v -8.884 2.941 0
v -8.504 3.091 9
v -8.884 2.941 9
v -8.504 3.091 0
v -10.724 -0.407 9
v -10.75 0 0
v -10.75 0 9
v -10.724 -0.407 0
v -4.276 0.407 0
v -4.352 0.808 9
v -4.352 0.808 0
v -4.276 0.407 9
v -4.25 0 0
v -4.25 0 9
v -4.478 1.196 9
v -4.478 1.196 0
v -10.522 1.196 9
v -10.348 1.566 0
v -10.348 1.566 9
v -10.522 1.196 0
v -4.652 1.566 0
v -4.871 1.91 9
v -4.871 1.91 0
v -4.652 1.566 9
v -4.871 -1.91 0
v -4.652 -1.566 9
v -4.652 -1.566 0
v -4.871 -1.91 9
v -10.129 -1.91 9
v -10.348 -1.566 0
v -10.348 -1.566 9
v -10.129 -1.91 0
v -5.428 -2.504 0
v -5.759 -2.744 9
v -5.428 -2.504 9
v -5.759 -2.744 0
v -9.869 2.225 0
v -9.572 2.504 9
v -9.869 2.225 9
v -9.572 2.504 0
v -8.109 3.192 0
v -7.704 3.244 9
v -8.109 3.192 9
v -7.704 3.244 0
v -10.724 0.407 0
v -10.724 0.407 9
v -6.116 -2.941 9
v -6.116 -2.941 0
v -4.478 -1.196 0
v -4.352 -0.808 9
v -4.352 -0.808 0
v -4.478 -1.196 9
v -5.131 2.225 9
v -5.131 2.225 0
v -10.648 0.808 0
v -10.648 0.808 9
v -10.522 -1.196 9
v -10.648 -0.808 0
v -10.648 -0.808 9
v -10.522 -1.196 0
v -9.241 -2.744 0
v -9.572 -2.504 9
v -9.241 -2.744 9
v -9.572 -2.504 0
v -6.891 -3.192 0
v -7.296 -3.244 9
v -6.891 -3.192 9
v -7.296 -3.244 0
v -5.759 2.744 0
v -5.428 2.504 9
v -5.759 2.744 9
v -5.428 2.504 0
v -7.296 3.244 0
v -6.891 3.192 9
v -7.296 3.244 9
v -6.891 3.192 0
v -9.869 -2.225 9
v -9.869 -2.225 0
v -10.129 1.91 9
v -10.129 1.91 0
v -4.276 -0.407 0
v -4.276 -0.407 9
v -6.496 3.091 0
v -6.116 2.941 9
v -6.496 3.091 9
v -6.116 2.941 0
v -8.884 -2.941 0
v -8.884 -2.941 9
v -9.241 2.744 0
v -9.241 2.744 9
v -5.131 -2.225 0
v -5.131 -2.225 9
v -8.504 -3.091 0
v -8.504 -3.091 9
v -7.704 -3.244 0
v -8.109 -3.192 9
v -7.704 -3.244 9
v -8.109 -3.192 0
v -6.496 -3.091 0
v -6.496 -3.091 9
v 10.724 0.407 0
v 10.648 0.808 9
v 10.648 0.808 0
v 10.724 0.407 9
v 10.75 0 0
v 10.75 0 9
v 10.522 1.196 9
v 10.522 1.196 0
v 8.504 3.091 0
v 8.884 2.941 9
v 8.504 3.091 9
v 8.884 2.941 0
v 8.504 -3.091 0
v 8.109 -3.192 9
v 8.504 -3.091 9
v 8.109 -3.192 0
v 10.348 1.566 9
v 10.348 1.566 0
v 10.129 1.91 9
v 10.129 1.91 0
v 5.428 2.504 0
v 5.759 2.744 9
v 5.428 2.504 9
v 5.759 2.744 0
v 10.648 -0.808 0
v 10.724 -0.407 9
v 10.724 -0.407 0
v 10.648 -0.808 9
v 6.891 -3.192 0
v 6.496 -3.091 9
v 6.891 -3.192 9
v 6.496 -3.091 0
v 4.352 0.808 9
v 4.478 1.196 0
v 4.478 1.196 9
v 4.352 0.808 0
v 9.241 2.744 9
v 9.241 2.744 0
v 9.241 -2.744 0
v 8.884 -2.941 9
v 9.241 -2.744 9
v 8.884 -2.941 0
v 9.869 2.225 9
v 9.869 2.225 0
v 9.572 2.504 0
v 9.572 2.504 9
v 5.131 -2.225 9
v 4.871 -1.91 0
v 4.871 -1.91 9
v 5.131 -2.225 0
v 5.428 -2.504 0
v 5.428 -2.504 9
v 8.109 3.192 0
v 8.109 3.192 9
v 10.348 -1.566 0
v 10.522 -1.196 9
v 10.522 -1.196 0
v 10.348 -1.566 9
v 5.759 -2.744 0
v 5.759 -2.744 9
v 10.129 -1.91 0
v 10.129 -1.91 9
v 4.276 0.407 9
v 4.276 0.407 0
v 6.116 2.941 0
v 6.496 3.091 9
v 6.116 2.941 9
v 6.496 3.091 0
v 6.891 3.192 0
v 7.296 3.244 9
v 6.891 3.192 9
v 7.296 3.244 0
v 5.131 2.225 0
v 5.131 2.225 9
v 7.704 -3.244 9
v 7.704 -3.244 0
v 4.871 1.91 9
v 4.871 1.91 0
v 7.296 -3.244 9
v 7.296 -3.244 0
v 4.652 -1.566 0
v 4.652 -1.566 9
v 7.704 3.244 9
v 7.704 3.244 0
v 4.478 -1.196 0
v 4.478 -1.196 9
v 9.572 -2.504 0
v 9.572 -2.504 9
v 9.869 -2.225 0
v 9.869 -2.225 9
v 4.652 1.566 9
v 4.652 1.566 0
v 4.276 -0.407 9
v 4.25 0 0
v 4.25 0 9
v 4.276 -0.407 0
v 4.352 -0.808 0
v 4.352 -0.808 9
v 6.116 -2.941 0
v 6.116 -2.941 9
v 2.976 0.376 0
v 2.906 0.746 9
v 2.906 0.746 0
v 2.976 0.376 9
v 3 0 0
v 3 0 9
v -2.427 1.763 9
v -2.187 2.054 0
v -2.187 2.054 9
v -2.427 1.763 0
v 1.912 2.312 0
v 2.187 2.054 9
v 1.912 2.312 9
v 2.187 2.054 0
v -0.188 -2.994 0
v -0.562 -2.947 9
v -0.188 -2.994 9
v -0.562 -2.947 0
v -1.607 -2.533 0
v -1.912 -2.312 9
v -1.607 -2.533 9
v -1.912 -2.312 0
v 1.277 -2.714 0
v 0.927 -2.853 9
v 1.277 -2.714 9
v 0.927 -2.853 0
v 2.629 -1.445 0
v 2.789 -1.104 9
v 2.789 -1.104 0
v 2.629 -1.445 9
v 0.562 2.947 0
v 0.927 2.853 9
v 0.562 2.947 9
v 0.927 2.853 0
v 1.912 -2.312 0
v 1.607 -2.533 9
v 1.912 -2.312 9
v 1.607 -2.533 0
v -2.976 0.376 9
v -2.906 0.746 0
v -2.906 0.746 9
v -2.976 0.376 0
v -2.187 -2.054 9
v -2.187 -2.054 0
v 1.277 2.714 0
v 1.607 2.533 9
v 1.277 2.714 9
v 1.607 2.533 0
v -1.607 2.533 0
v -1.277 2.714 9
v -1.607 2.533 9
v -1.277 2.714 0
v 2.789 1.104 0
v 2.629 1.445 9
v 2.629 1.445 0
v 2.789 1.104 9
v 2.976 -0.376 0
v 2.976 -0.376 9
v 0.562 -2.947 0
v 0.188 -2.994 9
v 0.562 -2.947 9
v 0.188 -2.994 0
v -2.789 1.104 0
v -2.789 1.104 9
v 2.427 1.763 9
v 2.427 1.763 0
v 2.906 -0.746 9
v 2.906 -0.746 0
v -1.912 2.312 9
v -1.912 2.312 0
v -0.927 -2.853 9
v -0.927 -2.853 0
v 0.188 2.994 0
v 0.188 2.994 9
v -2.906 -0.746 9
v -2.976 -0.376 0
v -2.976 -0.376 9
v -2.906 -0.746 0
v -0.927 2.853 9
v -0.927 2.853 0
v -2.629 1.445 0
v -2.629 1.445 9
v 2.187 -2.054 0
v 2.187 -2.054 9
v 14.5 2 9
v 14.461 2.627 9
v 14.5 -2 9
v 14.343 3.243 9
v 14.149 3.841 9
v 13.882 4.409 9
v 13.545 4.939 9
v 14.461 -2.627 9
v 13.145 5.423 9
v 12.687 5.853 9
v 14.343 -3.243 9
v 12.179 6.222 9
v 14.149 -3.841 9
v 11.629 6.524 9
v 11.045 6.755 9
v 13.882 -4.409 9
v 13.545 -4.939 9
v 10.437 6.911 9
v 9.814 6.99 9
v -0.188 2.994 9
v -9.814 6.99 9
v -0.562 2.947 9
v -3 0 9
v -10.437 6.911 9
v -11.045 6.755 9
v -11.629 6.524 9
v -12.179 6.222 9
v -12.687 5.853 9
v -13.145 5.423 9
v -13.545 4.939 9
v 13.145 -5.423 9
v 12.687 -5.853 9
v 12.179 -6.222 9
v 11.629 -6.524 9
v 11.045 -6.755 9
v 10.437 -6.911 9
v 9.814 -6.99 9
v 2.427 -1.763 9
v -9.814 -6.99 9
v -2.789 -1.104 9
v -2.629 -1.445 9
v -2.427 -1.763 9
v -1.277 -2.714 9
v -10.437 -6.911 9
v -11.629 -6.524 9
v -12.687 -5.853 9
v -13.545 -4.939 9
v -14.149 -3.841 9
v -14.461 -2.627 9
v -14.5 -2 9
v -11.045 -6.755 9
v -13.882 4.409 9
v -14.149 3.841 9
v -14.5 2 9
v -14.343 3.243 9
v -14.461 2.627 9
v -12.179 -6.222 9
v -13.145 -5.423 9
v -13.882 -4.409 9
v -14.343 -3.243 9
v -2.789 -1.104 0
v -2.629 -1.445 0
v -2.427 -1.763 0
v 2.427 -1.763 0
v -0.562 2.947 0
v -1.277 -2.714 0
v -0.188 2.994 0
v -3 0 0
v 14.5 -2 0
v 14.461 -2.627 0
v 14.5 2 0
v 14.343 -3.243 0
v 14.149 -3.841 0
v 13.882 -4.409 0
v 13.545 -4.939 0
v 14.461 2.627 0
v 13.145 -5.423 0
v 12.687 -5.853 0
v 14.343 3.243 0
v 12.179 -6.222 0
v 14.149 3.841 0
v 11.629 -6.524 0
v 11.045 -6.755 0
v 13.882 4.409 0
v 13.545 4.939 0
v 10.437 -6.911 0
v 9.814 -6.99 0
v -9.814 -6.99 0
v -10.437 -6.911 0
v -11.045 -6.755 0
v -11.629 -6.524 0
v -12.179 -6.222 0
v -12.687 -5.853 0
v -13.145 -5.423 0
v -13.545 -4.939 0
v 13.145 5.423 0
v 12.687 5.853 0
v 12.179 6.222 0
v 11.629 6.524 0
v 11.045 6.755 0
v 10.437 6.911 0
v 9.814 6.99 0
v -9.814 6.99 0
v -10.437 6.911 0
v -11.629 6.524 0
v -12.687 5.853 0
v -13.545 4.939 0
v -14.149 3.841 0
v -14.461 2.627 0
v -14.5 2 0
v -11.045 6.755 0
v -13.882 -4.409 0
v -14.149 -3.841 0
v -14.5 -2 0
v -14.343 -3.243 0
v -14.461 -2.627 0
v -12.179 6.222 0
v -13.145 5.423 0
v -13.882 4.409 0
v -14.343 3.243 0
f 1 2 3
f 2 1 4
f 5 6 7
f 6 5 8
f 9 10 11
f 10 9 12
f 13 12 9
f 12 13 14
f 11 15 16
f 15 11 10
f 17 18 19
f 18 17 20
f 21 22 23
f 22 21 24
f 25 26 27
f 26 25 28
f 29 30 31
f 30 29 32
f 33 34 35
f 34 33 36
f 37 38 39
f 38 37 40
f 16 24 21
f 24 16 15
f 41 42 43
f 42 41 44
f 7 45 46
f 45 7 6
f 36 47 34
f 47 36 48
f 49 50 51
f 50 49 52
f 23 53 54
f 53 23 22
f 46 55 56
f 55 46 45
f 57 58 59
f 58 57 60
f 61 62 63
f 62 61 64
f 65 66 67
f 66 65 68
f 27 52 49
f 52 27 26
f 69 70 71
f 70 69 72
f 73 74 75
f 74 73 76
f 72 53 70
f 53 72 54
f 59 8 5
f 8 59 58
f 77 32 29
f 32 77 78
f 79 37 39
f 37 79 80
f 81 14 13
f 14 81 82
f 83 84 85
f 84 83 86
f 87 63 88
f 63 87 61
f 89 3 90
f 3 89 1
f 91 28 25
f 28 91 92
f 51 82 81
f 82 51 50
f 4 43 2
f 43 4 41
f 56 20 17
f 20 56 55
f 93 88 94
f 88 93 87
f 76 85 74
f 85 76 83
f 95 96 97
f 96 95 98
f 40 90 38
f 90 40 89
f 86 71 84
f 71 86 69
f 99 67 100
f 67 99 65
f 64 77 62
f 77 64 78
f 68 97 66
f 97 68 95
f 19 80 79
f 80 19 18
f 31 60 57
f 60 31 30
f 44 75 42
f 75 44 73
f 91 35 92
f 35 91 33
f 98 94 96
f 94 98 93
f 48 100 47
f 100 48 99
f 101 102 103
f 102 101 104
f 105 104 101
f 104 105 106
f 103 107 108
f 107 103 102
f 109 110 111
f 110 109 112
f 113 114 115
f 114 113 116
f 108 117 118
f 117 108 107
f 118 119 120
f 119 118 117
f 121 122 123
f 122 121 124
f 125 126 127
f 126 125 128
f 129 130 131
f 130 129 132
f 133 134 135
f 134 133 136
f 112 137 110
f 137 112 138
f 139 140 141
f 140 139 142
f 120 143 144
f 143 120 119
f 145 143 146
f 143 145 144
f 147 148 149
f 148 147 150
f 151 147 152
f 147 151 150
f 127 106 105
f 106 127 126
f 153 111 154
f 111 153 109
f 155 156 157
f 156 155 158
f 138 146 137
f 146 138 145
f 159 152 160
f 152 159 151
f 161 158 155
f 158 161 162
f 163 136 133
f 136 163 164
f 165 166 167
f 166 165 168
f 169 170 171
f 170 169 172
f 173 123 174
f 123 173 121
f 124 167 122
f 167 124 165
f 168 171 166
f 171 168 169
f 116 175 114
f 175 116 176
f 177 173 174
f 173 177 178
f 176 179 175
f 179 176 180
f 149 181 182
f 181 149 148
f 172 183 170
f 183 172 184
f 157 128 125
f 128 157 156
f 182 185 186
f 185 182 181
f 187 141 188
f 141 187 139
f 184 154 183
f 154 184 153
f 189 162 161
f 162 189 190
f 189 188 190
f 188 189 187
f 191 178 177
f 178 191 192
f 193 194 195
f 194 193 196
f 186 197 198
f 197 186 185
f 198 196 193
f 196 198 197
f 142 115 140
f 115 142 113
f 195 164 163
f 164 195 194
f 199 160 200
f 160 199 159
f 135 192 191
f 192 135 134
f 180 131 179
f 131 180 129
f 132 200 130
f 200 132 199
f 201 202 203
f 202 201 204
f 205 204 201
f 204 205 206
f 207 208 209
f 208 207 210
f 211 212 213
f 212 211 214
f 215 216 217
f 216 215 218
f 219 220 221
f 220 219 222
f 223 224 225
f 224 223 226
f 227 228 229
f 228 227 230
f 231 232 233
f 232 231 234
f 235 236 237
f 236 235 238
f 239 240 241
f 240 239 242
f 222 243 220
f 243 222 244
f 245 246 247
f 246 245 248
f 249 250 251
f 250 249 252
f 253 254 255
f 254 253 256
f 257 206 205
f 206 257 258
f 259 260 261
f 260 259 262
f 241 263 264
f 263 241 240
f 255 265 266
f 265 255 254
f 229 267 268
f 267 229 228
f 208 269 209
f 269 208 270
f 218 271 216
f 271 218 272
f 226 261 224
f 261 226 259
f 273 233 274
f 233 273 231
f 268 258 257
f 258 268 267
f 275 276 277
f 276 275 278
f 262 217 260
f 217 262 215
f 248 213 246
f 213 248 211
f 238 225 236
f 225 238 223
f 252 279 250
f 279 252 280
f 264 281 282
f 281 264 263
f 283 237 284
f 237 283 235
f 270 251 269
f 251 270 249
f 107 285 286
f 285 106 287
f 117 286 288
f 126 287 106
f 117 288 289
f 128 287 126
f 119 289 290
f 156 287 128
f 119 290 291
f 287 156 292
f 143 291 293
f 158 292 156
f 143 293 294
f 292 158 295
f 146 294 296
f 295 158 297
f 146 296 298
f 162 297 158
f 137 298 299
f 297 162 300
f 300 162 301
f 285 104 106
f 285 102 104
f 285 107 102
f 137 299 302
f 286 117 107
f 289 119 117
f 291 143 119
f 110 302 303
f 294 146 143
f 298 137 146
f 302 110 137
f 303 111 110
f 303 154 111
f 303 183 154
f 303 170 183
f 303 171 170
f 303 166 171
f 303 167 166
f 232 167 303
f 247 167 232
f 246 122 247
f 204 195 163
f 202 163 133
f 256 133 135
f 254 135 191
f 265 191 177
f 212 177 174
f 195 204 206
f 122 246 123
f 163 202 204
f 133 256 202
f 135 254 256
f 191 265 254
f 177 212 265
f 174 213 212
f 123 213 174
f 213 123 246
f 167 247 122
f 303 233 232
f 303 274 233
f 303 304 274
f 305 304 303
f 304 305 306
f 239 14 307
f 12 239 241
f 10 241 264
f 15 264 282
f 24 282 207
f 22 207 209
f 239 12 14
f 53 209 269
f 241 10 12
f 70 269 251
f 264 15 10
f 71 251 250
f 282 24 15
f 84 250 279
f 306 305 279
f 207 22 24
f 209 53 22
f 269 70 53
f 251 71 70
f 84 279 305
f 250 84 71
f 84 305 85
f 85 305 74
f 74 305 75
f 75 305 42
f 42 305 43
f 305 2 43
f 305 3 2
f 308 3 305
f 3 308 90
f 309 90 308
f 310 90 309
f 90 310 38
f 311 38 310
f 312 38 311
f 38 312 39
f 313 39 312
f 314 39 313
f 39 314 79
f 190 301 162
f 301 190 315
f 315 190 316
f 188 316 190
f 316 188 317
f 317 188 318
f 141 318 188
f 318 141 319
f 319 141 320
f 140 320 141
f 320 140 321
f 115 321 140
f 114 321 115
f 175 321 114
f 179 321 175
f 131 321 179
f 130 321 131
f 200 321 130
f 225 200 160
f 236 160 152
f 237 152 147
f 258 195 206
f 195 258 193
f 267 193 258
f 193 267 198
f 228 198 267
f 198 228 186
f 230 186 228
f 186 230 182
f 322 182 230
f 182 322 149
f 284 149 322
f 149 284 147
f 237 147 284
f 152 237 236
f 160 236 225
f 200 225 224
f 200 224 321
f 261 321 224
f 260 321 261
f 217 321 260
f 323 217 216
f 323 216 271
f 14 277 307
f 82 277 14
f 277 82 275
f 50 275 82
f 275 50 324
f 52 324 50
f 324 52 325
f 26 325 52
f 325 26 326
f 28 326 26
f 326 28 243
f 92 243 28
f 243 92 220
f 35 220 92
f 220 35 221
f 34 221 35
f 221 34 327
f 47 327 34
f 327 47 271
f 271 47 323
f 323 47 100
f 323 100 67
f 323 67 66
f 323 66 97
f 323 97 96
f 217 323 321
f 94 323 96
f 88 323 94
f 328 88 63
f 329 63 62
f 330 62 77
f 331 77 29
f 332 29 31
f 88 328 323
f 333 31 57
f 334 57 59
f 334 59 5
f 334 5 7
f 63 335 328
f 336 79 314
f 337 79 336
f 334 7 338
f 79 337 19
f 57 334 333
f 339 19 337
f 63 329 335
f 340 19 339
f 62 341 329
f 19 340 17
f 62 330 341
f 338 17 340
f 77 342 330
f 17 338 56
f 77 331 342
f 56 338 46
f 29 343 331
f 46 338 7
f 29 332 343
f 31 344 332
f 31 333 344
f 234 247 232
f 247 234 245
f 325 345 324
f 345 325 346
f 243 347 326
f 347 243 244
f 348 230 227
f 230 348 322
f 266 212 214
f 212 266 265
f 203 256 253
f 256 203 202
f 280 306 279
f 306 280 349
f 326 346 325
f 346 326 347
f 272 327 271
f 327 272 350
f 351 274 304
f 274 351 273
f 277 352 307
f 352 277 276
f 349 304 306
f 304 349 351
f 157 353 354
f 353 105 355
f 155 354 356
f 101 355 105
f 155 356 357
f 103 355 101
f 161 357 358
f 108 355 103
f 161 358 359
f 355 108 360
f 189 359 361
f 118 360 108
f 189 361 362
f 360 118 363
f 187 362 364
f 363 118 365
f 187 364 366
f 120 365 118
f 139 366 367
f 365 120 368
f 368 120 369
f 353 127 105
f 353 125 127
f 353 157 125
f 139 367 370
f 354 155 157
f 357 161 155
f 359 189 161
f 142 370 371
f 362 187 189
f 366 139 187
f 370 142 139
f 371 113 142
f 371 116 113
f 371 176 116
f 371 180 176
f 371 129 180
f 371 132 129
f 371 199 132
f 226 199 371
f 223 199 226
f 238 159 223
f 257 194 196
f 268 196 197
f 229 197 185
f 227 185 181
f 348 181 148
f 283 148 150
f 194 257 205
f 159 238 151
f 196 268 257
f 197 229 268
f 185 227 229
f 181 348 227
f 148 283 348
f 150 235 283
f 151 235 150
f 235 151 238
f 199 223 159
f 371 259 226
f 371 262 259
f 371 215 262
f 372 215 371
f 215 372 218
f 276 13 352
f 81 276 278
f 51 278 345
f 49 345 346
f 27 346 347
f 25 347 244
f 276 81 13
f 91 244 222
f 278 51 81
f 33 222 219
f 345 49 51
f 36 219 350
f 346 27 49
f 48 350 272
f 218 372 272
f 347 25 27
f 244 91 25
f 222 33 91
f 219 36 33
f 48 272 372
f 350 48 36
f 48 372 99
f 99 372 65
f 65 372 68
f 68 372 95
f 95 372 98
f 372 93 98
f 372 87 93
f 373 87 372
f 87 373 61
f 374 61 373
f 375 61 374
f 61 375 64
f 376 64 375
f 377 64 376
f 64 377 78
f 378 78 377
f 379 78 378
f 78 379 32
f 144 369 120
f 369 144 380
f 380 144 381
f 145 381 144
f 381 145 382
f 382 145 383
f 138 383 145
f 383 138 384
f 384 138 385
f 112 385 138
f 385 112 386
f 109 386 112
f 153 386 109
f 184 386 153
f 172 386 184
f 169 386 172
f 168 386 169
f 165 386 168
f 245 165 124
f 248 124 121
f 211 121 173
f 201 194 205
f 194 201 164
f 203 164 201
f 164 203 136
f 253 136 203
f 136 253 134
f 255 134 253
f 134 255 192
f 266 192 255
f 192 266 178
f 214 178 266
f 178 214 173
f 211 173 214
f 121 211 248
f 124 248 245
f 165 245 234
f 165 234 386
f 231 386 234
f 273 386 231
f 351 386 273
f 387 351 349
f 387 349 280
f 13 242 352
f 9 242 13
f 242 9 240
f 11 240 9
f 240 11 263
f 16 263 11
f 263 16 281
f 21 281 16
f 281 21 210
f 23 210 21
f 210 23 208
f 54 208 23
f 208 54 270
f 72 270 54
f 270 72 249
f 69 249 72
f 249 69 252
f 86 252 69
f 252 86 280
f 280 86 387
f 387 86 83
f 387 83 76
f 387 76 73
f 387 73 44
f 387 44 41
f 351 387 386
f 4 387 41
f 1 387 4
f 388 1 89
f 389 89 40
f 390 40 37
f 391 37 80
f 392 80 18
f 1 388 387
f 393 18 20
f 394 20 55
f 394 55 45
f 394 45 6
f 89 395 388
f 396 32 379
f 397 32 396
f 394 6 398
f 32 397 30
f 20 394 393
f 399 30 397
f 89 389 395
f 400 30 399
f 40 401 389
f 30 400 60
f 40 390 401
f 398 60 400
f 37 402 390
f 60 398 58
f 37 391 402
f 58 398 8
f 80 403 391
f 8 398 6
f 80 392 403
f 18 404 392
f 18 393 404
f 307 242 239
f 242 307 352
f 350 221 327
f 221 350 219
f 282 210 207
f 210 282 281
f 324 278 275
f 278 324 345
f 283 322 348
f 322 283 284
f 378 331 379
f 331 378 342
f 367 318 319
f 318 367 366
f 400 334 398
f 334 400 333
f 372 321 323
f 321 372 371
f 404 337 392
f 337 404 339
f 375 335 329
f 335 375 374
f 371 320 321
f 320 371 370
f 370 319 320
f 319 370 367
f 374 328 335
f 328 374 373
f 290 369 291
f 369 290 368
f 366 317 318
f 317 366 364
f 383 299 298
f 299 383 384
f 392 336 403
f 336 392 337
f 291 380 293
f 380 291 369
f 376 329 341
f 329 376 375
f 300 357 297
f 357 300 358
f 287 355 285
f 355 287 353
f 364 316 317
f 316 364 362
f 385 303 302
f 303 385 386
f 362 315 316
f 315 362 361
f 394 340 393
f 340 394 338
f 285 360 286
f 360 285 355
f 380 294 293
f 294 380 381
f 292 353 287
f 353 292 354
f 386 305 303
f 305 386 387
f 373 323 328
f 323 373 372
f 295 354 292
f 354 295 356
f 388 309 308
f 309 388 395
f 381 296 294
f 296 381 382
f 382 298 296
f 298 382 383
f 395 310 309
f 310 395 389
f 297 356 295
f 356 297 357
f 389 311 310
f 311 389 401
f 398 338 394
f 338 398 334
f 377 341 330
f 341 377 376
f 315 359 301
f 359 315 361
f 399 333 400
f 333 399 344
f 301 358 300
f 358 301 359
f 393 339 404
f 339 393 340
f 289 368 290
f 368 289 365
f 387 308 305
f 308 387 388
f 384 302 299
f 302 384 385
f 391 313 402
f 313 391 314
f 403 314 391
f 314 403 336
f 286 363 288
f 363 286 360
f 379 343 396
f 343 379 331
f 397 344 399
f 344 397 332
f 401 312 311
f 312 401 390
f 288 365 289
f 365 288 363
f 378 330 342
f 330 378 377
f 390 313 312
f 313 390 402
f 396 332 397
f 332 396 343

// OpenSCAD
$fn = 50;


difference() {
	union() {
		hull() {
			translate(v = [-9.5000000000, 2.0000000000, 0]) {
				cylinder(h = 9, r = 5);
			}
			translate(v = [9.5000000000, 2.0000000000, 0]) {
				cylinder(h = 9, r = 5);
			}
			translate(v = [-9.5000000000, -2.0000000000, 0]) {
				cylinder(h = 9, r = 5);
			}
			translate(v = [9.5000000000, -2.0000000000, 0]) {
				cylinder(h = 9, r = 5);
			}
		}
	}
	union() {
		#translate(v = [-7.5000000000, 0.0000000000, 0]) {
			cylinder(h = 9, r = 3.2500000000);
		}
		#translate(v = [7.5000000000, 0.0000000000, 0]) {
			cylinder(h = 9, r = 3.2500000000);
		}
		#translate(v = [-7.5000000000, 0.0000000000, -100.0000000000]) {
			cylinder(h = 200, r = 3.2500000000);
		}
		#translate(v = [-7.5000000000, 0.0000000000, -100.0000000000]) {
			cylinder(h = 200, r = 3.2500000000);
		}
		#translate(v = [7.5000000000, 0.0000000000, -100.0000000000]) {
			cylinder(h = 200, r = 3.2500000000);
		}
		#translate(v = [7.5000000000, 0.0000000000, -100.0000000000]) {
			cylinder(h = 200, r = 3.2500000000);
		}
		#translate(v = [-7.5000000000, 0.0000000000, 0]) {
			cylinder(h = 9, r = 1.8000000000);
		}
		#translate(v = [7.5000000000, 0.0000000000, 0]) {
			cylinder(h = 9, r = 1.8000000000);
		}
		#translate(v = [-7.5000000000, 0.0000000000, 0]) {
			cylinder(h = 9, r = 1.8000000000);
		}
		#translate(v = [7.5000000000, 0.0000000000, 0]) {
			cylinder(h = 9, r = 1.8000000000);
		}
		#translate(v = [-7.5000000000, 0.0000000000, 0]) {
			cylinder(h = 9, r = 1.8000000000);
		}
		#translate(v = [7.5000000000, 0.0000000000, 0]) {
			cylinder(h = 9, r = 1.8000000000);
		}
		#cylinder(h = 9, r = 3.0000000000);
	}
}
